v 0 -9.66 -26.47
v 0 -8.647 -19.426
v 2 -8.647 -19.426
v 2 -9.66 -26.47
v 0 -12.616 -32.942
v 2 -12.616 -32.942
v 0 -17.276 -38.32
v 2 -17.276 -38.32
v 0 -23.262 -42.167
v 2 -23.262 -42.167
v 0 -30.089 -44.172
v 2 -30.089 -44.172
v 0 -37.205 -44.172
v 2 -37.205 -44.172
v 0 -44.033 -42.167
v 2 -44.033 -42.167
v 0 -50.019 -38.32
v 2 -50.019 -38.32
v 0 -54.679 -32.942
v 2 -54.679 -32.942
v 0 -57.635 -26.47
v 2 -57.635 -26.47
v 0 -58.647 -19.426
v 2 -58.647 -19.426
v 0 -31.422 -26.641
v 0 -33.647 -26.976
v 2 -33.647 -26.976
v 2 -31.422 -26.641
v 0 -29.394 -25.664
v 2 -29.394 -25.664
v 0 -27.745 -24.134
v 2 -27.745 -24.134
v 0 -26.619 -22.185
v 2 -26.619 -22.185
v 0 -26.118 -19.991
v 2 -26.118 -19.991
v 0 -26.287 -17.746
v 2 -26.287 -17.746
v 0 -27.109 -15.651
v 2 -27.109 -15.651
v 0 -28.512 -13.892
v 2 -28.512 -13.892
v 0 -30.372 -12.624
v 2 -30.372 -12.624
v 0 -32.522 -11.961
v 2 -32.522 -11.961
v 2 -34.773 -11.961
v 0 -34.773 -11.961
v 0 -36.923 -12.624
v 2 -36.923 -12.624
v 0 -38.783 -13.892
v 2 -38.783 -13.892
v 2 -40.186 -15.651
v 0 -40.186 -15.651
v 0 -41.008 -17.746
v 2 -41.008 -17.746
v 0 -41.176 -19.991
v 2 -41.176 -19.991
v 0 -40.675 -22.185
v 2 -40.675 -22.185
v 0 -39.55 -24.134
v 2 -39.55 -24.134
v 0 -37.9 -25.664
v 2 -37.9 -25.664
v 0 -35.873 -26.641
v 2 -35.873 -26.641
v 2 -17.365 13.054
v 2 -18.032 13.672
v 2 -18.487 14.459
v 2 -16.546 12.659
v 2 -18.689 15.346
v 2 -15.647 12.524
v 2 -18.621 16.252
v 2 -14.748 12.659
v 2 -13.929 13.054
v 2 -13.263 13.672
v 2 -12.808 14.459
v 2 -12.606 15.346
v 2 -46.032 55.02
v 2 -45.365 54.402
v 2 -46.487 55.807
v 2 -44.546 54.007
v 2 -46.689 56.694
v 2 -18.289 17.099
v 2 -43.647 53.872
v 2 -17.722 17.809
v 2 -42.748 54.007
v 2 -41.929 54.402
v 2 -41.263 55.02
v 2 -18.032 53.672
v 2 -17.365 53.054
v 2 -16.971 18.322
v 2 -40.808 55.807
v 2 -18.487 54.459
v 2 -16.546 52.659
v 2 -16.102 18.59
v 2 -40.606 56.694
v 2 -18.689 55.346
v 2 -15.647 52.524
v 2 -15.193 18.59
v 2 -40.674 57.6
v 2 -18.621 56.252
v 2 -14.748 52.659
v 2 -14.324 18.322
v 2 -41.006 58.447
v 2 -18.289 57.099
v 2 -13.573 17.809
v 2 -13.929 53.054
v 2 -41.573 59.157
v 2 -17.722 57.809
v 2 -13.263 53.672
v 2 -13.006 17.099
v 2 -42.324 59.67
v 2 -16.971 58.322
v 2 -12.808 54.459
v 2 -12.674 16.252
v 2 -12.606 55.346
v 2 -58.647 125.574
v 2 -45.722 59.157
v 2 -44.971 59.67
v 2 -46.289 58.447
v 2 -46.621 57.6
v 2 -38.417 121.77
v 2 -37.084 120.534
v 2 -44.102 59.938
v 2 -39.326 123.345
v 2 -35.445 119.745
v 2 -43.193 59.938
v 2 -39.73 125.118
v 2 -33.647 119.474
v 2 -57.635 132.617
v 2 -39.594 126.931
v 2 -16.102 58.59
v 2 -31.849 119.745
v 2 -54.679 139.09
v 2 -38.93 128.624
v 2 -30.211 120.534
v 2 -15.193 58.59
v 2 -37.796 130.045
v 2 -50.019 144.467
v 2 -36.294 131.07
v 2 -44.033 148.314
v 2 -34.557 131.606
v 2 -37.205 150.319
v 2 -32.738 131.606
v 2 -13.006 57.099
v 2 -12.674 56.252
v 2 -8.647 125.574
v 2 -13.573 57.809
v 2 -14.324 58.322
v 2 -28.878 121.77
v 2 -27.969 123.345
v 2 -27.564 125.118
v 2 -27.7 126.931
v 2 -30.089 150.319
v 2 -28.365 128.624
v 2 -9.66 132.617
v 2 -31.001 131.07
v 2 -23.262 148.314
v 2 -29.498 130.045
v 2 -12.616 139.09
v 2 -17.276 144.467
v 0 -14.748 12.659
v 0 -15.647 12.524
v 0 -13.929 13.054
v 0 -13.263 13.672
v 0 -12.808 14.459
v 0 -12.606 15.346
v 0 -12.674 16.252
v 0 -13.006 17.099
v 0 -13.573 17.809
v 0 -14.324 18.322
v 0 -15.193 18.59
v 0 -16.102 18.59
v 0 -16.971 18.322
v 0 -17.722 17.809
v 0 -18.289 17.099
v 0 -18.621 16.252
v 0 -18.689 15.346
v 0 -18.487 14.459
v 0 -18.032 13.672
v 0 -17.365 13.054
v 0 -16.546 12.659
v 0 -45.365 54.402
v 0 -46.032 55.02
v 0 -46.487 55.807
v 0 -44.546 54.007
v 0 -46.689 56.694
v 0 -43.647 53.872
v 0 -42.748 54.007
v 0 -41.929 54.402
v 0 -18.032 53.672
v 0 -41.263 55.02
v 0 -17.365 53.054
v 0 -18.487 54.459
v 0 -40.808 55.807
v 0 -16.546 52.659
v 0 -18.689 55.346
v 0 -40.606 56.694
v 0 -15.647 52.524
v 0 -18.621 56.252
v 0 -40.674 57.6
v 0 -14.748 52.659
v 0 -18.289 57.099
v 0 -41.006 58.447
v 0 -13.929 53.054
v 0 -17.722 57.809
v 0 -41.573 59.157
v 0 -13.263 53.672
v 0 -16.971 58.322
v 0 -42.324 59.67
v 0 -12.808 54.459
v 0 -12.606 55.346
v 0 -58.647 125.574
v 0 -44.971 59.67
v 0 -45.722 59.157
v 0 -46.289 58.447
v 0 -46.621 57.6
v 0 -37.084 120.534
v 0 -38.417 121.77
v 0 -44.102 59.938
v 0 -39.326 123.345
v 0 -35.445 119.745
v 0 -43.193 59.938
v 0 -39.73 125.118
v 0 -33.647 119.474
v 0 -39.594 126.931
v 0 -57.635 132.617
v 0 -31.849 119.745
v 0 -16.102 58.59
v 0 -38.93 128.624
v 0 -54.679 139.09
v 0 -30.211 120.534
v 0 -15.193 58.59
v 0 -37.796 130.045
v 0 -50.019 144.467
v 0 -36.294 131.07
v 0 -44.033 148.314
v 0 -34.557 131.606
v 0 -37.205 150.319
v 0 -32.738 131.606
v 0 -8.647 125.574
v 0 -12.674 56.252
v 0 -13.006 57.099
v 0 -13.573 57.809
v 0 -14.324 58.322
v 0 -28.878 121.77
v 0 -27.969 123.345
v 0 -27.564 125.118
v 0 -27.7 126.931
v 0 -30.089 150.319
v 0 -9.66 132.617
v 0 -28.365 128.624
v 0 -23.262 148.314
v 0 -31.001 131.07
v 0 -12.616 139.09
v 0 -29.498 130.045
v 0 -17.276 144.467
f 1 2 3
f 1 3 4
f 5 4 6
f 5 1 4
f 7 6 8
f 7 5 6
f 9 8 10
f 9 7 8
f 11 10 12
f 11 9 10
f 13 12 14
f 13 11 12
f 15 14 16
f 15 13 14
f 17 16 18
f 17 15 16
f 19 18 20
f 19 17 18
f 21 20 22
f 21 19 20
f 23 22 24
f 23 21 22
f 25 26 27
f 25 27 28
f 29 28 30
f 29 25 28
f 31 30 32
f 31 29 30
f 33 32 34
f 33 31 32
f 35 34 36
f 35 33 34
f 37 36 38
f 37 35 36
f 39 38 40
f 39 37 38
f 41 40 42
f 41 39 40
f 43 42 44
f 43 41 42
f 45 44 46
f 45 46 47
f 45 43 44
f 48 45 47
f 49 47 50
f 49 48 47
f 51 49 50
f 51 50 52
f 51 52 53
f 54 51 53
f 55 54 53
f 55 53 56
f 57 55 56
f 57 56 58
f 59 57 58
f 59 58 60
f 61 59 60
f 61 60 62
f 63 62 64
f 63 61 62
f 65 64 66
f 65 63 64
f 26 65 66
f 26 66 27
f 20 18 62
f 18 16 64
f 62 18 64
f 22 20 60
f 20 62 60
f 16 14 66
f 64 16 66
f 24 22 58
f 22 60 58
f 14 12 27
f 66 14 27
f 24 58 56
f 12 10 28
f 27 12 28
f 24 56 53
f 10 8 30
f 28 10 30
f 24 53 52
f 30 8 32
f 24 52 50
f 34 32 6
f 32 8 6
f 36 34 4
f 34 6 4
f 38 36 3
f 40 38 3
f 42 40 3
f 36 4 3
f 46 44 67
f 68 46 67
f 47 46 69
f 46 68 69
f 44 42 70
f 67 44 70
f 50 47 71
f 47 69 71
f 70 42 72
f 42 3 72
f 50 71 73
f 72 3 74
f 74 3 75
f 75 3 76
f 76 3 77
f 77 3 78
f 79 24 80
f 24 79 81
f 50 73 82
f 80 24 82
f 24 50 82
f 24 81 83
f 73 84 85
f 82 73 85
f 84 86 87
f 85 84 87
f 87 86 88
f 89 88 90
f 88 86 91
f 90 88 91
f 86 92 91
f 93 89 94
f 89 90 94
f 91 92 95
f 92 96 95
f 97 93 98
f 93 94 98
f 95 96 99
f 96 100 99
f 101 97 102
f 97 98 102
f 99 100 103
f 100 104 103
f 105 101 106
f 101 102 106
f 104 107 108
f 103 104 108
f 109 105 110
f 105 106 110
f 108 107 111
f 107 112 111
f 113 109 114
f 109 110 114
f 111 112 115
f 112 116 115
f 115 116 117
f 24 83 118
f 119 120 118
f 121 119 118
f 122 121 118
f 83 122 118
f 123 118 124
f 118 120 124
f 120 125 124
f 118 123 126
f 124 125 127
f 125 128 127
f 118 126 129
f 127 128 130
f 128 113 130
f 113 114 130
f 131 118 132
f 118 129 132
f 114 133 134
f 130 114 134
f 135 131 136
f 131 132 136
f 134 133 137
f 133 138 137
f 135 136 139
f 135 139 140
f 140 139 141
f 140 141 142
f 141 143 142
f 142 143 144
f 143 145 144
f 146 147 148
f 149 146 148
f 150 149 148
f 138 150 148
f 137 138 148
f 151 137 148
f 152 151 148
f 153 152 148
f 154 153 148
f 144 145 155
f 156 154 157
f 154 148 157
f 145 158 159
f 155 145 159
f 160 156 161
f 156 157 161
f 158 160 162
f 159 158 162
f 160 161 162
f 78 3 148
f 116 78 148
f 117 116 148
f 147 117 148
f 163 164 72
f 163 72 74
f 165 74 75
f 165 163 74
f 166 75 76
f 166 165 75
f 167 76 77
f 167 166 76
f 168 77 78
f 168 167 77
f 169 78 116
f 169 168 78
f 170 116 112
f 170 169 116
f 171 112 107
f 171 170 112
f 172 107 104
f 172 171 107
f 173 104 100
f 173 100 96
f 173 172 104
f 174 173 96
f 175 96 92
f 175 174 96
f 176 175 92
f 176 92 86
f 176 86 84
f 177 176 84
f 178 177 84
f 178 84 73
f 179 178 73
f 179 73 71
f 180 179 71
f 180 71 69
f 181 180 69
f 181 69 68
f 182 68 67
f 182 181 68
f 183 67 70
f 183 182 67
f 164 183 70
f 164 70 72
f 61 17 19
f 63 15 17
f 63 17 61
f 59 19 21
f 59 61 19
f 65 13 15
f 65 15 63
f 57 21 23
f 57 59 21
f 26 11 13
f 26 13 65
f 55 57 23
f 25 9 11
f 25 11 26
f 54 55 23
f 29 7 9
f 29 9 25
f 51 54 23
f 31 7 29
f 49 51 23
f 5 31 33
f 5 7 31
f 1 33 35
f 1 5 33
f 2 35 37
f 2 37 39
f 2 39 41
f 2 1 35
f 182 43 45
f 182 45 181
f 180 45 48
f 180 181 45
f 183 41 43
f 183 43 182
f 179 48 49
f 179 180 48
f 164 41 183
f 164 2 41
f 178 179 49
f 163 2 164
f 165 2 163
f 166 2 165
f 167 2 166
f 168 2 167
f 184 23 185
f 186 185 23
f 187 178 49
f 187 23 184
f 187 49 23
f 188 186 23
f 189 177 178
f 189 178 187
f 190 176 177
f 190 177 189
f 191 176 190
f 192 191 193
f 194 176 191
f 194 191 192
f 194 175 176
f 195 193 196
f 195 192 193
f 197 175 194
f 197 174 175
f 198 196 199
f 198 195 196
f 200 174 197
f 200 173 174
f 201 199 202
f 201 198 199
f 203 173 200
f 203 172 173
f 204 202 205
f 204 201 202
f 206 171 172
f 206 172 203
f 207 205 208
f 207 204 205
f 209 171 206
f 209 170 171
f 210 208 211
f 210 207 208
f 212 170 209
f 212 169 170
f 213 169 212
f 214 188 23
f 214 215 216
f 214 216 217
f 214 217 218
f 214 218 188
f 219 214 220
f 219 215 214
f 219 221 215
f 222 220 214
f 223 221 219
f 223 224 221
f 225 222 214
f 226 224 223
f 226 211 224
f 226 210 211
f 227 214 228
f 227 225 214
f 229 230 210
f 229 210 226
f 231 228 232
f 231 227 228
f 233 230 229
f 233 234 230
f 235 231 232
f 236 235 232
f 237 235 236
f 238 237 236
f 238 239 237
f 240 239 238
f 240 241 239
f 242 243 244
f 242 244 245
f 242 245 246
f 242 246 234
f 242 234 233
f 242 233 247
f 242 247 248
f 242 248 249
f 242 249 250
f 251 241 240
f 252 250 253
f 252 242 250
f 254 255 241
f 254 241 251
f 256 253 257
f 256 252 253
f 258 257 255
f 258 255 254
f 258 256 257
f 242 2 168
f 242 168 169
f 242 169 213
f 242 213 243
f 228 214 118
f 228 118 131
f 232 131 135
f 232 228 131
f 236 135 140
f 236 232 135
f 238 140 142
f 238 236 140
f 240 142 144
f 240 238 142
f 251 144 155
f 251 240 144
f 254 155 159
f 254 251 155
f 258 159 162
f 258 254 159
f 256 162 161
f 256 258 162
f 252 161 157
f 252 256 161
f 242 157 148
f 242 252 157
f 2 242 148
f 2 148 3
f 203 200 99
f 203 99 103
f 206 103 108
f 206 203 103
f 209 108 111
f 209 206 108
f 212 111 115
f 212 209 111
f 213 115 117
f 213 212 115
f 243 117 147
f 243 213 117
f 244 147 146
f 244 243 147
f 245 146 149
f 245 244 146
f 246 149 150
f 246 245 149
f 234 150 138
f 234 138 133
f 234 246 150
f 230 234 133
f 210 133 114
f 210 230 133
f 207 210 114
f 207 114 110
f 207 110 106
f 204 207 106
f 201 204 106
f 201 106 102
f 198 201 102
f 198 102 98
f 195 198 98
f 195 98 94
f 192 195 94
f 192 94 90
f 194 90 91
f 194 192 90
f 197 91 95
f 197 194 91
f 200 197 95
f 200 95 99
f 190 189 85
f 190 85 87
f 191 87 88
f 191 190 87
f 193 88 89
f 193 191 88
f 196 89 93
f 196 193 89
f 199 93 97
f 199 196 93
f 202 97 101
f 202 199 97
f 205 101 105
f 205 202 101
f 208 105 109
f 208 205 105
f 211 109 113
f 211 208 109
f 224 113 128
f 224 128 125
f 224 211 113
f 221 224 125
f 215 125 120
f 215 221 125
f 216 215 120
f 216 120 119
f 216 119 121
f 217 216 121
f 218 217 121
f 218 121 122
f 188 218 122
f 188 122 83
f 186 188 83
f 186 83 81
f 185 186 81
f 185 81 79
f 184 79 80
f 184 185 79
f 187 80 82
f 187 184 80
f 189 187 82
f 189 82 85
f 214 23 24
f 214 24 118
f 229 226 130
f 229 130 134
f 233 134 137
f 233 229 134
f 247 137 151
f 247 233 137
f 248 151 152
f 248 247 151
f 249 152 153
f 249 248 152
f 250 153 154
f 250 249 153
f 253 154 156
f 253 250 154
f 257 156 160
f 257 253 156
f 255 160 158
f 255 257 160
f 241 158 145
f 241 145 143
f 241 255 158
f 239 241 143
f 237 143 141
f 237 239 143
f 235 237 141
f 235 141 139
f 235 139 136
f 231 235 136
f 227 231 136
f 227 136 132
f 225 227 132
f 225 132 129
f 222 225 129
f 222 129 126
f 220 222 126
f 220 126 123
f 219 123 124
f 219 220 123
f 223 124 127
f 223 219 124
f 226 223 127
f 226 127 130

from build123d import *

# Parameters (mm, degrees)
SKETCH_1_R      = 7.55
SKETCH_1_R_2    = 6.1
SKETCH_1_R_3    = 3.05
EXTRUDE_1_DEPTH = 2


with BuildPart() as part:
    # 草图1 → 凸台-拉伸1 (new body)
    with BuildSketch(Plane(origin=(0, 0, 0), x_dir=(0, 0, -1), z_dir=(1, 0, 0))):
        with BuildLine():
            Line((19.426316451, -58.647367097), (-125.573683549, -58.647367097))
            ThreePointArc((-125.573683549, -58.647367097), (-150.573683549, -33.647367097), (-125.573683549, -8.647367097))
            Line((-125.573683549, -8.647367097), (4.992559722, -8.647367097))
            Line((4.992559722, -8.647367097), (19.426316451, -8.647367097))
            ThreePointArc((19.426316451, -8.647367097), (44.426316451, -33.647367097), (19.426316451, -58.647367097))
        make_face()
        with Locations((19.426316451, -33.647367097)):
            Circle(SKETCH_1_R, mode=Mode.SUBTRACT)
        with Locations((-125.573683549, -33.647367097)):
            Circle(SKETCH_1_R_2, mode=Mode.SUBTRACT)
        with Locations((-56.921571535, -43.647367097)):
            Circle(SKETCH_1_R_3, mode=Mode.SUBTRACT)
        with Locations((-15.573683549, -15.647367097)):
            Circle(SKETCH_1_R_3, mode=Mode.SUBTRACT)
        with Locations((-55.573683549, -15.647367097)):
            Circle(SKETCH_1_R_3, mode=Mode.SUBTRACT)
    extrude(amount=EXTRUDE_1_DEPTH)


solid = part.part
